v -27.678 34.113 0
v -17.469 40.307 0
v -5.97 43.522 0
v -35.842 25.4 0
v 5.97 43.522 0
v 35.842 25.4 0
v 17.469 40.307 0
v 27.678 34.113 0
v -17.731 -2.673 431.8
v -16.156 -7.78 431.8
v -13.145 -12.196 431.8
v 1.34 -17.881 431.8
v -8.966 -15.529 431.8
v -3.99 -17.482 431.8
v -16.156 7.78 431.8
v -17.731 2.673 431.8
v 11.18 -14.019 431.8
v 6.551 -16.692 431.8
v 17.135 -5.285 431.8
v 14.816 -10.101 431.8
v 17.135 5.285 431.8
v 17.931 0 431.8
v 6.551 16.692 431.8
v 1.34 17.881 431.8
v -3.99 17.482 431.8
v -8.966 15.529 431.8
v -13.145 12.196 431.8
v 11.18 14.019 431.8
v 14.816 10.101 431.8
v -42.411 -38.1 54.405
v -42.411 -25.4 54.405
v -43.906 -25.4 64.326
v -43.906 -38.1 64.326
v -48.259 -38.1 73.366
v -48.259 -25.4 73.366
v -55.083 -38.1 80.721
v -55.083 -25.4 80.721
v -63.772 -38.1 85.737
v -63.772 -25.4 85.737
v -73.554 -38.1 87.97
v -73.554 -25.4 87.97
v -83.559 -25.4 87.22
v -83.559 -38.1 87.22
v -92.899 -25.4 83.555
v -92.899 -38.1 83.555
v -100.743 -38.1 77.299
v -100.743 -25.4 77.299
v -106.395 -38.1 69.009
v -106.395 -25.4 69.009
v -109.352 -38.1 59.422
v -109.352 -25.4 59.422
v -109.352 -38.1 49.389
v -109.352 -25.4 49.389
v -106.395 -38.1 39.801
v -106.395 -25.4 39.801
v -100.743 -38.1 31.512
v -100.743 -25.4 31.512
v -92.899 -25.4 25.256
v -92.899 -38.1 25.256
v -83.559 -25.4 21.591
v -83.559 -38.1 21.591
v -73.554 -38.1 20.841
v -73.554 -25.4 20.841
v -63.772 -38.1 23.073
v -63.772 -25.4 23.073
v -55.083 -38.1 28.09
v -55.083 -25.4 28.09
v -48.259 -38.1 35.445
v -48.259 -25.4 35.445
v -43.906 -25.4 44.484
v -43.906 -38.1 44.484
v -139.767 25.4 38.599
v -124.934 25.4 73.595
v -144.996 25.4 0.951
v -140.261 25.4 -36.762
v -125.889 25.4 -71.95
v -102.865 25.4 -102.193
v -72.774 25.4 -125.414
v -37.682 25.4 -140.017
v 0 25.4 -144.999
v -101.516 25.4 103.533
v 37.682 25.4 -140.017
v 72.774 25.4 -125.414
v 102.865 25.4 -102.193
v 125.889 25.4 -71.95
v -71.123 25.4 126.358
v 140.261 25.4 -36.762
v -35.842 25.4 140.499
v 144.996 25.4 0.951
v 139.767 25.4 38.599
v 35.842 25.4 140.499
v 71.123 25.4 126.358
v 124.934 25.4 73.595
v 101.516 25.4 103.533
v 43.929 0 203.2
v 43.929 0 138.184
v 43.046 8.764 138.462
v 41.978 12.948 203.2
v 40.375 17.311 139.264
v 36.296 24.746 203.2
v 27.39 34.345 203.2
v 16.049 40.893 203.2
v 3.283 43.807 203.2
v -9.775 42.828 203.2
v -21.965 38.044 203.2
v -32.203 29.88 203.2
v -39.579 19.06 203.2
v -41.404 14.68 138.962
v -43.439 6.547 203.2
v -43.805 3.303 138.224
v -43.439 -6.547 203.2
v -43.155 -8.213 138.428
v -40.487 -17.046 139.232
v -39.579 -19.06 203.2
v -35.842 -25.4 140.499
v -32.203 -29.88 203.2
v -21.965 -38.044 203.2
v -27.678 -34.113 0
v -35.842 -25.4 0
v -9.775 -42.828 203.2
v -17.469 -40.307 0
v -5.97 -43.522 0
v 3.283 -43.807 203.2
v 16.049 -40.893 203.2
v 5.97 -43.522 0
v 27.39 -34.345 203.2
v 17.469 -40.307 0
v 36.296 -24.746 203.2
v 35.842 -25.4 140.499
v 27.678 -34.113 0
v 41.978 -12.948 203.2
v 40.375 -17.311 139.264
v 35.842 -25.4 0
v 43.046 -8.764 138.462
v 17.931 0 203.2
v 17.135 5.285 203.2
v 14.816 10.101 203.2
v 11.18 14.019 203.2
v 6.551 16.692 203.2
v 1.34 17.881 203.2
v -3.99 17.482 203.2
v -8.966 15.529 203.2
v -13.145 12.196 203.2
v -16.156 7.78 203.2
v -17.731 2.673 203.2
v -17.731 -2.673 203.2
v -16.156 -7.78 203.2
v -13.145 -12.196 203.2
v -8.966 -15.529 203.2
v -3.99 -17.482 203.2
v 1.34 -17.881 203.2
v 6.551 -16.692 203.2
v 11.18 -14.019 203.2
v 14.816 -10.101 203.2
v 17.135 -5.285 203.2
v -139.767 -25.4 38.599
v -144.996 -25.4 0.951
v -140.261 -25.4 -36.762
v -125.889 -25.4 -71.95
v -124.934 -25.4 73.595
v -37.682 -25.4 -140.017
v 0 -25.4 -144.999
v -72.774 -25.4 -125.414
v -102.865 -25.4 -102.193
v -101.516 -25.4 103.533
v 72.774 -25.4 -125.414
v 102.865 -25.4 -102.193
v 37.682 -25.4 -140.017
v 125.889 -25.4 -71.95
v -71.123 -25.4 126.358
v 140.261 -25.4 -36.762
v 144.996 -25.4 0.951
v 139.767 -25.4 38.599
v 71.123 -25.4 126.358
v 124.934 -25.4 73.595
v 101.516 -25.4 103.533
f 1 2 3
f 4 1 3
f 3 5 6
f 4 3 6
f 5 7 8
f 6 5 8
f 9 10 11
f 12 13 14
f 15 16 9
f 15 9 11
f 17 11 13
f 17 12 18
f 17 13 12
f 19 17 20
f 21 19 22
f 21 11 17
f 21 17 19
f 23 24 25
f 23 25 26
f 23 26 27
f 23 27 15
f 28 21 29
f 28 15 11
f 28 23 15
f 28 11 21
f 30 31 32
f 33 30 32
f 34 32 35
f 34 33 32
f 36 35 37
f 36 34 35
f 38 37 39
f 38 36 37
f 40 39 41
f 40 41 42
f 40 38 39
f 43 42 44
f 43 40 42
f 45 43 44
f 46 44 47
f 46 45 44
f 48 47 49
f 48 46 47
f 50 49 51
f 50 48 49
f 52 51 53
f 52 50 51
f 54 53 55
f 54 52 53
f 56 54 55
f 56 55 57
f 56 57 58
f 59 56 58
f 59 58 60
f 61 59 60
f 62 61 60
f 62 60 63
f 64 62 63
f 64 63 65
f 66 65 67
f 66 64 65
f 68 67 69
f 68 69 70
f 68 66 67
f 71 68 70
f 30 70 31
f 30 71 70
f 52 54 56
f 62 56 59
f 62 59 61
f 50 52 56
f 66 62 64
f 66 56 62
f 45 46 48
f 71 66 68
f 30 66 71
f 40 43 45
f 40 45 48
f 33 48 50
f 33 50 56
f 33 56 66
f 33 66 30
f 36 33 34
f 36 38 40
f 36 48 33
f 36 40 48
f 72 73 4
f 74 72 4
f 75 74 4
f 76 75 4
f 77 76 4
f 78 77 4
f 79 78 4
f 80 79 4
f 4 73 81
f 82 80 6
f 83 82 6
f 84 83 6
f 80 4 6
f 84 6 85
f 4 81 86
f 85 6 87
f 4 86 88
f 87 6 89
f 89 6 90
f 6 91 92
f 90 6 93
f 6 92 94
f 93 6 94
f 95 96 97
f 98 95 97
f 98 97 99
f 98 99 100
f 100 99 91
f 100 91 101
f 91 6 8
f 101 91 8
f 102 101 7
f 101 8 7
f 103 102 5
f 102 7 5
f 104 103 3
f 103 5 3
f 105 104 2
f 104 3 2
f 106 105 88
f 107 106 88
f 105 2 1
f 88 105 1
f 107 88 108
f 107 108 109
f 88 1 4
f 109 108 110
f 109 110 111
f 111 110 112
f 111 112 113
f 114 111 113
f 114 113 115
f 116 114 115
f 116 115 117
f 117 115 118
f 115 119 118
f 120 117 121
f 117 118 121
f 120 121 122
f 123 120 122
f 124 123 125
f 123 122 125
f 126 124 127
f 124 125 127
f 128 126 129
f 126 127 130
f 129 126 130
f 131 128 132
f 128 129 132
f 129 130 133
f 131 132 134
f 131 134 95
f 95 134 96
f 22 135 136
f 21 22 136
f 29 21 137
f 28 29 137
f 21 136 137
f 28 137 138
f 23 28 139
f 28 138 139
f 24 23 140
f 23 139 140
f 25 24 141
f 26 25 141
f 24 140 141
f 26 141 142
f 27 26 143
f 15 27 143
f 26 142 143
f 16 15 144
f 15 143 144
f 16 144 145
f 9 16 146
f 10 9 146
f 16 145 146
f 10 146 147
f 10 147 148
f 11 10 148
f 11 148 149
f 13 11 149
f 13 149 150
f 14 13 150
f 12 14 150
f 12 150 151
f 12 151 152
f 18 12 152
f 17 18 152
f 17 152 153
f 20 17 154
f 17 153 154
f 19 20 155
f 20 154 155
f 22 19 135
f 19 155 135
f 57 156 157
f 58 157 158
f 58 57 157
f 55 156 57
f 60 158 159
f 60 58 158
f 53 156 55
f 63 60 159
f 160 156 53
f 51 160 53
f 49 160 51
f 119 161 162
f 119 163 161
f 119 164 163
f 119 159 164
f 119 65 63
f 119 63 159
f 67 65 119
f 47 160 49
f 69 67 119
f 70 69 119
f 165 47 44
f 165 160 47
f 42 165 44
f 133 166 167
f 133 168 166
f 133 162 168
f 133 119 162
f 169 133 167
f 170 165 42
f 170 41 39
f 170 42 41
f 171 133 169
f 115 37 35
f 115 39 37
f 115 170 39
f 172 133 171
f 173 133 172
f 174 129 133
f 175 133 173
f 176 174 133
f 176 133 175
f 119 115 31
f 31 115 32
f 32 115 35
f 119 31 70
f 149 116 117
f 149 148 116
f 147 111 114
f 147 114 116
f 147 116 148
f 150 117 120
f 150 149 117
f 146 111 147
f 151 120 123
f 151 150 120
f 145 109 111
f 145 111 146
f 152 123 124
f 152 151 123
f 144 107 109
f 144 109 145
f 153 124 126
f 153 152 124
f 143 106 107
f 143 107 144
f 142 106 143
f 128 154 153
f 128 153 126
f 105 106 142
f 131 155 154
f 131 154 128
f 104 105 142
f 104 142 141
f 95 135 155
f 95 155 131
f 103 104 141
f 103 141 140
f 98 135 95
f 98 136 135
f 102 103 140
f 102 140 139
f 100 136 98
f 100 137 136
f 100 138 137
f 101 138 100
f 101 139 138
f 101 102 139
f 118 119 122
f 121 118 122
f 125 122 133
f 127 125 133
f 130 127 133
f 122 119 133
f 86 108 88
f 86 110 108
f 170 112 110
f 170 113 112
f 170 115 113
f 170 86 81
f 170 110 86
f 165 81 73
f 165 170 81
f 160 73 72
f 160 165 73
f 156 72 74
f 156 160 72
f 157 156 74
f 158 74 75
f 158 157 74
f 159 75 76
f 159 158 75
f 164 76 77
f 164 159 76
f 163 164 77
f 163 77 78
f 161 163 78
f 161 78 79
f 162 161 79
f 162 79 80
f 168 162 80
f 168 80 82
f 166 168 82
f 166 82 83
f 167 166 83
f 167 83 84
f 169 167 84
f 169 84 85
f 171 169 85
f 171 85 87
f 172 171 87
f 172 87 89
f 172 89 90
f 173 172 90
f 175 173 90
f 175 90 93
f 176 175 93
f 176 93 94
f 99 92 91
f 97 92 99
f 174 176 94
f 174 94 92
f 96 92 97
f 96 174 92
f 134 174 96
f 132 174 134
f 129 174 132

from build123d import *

# Parameters (mm, degrees)
F0_R     = 43.929469
F1_DEPTH = 203.2
F2_R     = 17.931427
F3_DEPTH = 228.6
F4_R     = 144.998966
F5_DEPTH = 25.4
F6_R     = 33.658576
F7_DEPTH = 12.7


with BuildPart() as f1:
    # F0 (on Top) → F1 (new body)
    with BuildSketch(Plane.XY):
        Circle(F0_R)
    extrude(amount=F1_DEPTH)

    # F2 (on face) → F3 (join)
    with BuildSketch(Plane.XY.offset(203.2)):
        Circle(F2_R)
    extrude(amount=F3_DEPTH)

    # F4 (on Front) → F5 (join, symmetric)
    with BuildSketch(Plane.XZ):
        Circle(F4_R)
    extrude(amount=F5_DEPTH, both=True)

    # F6 (on face) → F7 (join, symmetric)
    with BuildSketch(Plane.XZ.offset(25.4)):
        with Locations((-76.069236, 54.405343)):
            Circle(F6_R)
    extrude(amount=F7_DEPTH, both=True)


solid = f1.part
